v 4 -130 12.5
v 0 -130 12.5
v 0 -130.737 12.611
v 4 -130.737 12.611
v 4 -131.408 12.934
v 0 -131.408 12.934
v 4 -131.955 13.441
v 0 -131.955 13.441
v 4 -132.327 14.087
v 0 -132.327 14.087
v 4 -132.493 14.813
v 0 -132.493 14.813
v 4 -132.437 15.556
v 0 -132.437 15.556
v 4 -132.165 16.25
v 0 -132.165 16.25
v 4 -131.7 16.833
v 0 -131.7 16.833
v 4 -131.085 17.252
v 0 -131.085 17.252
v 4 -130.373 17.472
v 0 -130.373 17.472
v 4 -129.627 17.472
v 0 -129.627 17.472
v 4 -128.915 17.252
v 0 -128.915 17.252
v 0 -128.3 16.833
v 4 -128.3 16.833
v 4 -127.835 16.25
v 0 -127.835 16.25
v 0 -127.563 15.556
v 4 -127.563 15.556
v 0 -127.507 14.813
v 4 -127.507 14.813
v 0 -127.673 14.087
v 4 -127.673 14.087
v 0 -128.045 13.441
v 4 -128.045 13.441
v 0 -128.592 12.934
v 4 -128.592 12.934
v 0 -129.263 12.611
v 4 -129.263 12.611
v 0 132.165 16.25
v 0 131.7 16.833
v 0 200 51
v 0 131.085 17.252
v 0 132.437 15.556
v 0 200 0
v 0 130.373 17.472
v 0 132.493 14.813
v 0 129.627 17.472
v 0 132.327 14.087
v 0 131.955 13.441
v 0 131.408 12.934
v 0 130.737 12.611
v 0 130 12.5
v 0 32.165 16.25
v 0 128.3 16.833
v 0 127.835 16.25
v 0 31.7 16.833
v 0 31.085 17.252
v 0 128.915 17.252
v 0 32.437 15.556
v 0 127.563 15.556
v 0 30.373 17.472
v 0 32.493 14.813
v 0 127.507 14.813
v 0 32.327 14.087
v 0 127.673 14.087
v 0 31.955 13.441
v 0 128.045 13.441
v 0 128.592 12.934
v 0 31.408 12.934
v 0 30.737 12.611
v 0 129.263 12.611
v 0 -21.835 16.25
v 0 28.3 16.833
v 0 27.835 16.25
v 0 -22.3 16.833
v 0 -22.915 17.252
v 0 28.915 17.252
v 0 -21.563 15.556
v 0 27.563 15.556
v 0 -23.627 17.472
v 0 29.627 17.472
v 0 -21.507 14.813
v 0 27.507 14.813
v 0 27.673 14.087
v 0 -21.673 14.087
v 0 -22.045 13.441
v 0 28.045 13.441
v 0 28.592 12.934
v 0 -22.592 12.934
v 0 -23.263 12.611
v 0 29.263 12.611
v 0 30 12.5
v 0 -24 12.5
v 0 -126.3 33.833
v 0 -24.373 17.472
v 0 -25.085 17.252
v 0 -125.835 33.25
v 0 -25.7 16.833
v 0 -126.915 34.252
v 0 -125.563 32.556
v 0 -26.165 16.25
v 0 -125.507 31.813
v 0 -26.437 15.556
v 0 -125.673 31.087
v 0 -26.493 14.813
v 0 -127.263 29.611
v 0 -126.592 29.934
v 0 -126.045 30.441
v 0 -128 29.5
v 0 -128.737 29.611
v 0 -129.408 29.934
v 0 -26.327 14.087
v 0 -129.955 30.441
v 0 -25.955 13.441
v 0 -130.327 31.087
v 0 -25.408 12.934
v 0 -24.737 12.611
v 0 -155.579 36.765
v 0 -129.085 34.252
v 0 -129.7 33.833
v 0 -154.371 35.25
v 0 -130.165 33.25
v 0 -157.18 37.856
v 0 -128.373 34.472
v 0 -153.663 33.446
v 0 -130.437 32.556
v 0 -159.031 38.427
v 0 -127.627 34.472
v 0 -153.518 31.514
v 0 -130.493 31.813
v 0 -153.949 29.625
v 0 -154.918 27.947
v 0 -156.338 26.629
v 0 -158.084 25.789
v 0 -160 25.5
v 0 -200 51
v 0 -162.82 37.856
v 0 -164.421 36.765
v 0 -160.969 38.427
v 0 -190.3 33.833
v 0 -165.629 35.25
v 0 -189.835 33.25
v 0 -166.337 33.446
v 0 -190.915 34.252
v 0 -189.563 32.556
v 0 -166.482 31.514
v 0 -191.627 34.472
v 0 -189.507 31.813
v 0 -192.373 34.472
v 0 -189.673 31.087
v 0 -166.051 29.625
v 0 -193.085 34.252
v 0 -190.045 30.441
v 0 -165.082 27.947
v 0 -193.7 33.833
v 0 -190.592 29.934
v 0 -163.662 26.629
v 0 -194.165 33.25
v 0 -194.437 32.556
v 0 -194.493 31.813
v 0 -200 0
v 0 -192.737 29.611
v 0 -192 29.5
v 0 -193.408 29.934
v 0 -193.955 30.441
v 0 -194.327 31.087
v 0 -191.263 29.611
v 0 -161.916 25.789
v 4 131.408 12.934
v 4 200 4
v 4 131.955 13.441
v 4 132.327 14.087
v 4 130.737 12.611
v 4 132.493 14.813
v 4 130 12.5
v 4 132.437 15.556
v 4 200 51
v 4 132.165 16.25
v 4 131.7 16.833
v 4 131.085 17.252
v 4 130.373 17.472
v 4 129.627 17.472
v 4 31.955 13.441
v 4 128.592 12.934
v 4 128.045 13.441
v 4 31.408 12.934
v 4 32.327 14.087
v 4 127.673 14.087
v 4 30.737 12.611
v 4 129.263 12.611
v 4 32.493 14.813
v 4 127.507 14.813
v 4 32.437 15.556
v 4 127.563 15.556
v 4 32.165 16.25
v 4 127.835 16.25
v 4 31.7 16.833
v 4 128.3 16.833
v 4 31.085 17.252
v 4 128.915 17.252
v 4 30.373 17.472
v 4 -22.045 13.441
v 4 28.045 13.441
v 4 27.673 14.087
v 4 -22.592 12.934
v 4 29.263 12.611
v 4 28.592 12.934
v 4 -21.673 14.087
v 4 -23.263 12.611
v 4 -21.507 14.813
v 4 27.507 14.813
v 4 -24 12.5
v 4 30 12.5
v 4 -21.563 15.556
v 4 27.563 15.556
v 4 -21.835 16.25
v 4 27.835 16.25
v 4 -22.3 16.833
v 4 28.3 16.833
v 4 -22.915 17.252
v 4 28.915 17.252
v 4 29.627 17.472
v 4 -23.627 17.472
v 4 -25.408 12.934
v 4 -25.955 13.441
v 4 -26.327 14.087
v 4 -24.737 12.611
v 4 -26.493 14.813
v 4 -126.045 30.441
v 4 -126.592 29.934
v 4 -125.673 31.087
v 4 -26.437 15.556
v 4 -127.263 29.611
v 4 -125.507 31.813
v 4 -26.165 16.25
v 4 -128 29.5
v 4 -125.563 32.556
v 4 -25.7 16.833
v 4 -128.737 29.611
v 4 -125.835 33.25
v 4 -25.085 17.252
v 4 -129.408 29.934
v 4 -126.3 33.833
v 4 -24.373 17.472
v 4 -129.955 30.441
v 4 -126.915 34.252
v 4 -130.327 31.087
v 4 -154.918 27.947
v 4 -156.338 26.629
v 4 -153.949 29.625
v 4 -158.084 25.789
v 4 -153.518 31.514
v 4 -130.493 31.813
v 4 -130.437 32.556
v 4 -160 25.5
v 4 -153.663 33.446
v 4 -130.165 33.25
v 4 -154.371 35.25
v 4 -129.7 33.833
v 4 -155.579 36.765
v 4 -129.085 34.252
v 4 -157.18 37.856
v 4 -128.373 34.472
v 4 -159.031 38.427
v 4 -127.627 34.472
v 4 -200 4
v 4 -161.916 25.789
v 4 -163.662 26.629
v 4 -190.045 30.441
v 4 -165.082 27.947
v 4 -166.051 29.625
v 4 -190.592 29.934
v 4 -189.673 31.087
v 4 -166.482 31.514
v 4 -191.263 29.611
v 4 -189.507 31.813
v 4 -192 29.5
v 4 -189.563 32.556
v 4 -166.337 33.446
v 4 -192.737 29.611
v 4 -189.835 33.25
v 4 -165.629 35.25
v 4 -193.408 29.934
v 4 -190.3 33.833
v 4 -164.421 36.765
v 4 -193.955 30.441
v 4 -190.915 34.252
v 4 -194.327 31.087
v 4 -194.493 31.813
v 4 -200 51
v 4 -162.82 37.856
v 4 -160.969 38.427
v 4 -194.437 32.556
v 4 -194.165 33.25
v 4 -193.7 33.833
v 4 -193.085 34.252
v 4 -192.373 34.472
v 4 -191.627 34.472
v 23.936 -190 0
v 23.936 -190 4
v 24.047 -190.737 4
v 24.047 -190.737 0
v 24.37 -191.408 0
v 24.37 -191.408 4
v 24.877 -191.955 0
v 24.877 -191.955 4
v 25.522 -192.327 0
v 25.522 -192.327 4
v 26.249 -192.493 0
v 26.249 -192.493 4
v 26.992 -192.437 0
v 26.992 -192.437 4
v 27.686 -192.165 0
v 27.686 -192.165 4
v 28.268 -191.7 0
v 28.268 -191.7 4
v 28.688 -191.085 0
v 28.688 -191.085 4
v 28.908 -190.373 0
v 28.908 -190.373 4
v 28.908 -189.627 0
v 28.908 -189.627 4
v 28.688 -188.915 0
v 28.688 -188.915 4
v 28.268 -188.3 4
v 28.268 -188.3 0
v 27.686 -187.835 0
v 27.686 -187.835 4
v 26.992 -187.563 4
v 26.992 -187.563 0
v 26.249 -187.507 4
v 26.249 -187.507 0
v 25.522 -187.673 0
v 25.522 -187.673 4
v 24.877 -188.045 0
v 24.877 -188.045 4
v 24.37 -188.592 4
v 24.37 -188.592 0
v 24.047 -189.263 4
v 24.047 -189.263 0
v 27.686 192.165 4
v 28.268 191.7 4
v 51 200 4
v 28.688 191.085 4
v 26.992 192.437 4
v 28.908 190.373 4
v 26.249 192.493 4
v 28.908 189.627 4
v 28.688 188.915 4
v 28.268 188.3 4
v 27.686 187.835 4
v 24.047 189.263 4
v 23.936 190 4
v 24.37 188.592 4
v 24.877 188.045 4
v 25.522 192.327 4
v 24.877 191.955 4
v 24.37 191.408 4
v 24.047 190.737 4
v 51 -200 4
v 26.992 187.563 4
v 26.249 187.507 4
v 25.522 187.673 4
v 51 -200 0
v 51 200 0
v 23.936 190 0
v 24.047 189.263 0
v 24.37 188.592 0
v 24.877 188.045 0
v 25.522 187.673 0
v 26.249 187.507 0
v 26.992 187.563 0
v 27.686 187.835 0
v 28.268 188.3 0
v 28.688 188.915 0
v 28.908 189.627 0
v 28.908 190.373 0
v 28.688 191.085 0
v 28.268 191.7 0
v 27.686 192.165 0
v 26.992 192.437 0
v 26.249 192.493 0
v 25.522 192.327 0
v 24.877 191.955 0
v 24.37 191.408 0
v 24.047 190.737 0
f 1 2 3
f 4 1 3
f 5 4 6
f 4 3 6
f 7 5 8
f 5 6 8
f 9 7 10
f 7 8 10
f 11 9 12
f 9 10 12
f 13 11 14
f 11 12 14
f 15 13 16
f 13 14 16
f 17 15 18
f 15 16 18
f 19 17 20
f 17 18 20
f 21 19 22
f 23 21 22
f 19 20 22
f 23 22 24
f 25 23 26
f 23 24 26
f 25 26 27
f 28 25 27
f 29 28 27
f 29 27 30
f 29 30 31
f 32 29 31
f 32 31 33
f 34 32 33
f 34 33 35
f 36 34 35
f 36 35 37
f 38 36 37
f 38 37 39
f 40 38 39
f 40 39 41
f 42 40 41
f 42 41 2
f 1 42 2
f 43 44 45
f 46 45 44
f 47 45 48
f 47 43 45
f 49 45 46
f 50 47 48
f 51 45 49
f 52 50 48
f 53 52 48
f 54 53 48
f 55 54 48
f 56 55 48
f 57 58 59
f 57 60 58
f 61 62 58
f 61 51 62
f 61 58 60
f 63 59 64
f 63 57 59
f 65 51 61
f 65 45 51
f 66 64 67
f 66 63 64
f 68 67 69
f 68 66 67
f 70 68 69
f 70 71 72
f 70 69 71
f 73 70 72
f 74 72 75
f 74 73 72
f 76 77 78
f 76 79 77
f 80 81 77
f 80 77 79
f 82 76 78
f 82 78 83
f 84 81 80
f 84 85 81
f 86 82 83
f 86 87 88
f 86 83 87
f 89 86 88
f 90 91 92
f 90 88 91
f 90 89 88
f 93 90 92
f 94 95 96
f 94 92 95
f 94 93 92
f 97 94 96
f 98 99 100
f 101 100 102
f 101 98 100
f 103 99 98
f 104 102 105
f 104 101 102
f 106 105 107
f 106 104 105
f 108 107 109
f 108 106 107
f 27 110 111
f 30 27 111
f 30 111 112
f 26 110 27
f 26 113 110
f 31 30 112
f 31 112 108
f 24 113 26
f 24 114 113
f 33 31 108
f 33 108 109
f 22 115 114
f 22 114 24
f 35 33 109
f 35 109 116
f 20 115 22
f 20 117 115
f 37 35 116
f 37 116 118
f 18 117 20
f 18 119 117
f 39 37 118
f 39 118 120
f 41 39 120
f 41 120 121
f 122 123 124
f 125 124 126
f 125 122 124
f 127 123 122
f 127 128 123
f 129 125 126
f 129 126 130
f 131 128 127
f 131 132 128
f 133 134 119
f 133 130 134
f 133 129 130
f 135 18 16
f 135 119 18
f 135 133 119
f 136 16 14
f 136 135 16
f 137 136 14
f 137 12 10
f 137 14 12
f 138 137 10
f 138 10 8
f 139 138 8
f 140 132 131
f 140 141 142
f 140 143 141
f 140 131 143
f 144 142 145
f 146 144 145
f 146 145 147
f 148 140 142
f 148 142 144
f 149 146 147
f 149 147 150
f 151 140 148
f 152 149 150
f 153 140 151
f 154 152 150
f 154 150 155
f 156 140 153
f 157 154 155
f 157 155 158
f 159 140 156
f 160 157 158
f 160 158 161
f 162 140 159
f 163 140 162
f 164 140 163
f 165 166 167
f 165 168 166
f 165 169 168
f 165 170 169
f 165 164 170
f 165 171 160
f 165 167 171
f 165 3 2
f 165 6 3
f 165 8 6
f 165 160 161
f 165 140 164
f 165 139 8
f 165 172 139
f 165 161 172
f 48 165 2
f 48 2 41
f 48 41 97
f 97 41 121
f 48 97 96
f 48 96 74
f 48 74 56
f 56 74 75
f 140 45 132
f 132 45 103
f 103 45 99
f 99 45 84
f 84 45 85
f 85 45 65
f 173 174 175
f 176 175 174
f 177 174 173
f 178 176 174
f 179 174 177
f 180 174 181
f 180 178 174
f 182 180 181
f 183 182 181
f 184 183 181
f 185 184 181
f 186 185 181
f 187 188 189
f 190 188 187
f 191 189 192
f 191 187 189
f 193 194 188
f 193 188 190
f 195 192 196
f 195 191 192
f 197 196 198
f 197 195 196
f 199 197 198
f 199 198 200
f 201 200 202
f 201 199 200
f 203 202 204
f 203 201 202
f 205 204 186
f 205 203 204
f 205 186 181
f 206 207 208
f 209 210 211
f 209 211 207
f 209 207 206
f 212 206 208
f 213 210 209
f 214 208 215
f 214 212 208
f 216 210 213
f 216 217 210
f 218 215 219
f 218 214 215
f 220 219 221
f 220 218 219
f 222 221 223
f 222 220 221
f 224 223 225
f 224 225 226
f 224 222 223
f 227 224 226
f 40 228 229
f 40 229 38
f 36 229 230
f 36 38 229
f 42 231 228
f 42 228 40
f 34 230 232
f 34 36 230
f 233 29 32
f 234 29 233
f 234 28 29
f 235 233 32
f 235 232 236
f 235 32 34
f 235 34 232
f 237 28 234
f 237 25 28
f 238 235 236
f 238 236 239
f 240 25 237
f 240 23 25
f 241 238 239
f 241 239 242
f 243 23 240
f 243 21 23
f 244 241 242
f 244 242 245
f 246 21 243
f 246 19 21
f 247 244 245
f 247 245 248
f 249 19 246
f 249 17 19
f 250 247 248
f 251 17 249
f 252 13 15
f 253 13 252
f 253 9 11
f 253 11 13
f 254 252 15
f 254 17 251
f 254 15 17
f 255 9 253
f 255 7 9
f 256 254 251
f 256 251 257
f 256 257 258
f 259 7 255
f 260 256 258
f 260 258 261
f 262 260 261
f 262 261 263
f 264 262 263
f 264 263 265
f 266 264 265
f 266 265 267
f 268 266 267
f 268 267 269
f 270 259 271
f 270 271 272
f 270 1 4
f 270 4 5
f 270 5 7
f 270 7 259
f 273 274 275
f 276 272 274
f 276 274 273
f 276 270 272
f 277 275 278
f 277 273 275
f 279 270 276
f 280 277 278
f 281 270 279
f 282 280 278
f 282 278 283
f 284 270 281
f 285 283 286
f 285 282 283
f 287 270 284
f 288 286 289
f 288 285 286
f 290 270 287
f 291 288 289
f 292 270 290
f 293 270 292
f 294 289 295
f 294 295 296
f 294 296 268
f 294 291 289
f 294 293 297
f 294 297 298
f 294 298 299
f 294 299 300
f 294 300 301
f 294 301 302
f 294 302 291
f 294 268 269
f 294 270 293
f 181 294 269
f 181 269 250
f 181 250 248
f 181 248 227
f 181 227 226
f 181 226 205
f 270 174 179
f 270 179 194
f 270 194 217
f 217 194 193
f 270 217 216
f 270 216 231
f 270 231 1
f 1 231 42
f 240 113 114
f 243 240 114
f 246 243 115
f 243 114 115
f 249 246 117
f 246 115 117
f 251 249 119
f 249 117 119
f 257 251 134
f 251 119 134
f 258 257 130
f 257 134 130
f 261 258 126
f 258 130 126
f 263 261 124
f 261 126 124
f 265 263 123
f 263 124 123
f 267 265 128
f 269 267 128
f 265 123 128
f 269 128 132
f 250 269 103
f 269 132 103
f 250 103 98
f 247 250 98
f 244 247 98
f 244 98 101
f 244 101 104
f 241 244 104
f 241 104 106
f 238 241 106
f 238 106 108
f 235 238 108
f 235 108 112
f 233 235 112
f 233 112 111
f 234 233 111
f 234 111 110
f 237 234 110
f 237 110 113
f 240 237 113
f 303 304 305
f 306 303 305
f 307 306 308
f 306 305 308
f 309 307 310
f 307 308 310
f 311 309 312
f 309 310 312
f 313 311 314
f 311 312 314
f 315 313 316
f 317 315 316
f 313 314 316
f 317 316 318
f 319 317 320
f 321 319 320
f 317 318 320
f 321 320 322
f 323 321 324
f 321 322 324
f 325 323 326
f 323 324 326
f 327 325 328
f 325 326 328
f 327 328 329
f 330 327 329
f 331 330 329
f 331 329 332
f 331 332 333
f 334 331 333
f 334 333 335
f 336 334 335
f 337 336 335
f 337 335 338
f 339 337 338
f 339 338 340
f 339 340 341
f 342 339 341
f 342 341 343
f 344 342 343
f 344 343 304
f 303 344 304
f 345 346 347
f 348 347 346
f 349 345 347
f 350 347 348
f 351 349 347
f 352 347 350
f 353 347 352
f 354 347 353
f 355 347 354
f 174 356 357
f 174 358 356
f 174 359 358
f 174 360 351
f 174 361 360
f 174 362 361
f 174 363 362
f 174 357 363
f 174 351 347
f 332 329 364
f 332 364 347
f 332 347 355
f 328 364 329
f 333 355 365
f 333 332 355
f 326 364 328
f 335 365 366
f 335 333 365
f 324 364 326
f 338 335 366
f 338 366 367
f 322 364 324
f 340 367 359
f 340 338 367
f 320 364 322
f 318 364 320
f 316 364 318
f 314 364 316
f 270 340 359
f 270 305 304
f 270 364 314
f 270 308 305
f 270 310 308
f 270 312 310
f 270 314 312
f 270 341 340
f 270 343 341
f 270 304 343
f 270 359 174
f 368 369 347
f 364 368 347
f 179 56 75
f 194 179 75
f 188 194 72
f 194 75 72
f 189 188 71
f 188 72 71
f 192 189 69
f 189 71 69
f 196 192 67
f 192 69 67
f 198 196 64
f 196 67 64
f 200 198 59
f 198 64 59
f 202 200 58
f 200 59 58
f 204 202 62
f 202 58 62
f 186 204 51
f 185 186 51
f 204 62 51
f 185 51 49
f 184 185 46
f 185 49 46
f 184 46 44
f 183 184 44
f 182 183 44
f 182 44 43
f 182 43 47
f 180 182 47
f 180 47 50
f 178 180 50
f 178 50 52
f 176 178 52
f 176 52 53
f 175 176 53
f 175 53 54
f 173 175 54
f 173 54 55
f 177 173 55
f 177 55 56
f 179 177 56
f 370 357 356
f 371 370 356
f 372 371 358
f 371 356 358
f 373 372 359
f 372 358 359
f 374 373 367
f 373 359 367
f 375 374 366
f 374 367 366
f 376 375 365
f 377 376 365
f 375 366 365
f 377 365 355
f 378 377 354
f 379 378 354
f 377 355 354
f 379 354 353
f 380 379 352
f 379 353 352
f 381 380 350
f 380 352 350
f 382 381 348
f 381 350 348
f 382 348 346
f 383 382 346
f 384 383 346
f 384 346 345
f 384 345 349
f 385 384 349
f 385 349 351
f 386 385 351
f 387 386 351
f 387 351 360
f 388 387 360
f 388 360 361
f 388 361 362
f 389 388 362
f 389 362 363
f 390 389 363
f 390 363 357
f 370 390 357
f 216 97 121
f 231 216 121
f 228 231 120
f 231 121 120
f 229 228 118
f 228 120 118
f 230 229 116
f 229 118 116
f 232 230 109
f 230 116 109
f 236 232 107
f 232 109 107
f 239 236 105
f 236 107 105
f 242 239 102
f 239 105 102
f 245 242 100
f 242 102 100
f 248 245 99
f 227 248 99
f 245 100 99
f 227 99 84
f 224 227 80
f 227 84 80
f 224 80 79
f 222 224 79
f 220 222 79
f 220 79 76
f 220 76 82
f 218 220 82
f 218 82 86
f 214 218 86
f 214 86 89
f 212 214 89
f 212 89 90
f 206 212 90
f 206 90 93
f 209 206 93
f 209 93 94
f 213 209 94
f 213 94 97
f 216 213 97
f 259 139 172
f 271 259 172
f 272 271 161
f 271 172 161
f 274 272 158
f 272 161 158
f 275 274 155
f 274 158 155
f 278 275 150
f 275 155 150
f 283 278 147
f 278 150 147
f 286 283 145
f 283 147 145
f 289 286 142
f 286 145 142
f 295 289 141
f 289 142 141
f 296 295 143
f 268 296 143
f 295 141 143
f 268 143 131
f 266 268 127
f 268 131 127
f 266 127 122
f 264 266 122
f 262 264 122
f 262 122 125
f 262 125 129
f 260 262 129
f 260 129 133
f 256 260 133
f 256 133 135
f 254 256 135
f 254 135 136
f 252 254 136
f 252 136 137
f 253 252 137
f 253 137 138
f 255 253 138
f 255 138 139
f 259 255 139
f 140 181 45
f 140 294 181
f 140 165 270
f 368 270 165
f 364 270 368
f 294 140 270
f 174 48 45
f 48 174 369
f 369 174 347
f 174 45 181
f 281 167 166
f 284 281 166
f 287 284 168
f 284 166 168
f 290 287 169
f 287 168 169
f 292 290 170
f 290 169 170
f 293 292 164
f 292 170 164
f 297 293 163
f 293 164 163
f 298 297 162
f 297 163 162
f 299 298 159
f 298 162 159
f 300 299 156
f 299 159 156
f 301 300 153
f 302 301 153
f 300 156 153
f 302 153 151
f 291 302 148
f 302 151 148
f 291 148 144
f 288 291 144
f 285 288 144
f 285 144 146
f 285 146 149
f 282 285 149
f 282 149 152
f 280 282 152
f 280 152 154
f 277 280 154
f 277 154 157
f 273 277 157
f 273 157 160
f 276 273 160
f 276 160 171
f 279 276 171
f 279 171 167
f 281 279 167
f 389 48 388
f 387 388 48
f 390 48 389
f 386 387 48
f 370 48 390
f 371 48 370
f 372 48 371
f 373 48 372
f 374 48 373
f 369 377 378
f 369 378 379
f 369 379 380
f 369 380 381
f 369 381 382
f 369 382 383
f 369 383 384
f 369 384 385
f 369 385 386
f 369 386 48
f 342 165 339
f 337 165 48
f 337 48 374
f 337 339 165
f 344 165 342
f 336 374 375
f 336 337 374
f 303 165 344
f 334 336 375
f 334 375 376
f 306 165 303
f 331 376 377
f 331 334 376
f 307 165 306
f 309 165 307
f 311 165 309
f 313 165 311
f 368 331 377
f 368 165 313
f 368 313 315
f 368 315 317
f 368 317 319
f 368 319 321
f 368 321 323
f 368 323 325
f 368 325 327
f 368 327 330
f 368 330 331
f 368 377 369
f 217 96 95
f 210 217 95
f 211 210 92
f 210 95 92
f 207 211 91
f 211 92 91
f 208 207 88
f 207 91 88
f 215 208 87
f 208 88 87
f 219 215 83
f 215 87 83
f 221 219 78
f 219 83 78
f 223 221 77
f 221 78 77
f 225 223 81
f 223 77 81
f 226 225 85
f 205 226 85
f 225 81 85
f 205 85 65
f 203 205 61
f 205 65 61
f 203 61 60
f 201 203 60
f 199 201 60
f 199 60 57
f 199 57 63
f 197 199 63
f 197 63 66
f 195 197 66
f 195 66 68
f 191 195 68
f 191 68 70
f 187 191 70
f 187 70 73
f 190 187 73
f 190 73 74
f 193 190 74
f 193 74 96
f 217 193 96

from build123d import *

# Parameters (mm, degrees)
PAD_DEPTH         = 200
SKETCH001_R       = 2.5
POCKET_DEPTH      = 4.001
POCKET_DEPTH_BACK = -47.001
SKETCH003_R       = 2.5
SKETCH003_R_2     = 6.5
POCKET001_DEPTH   = 51.001


with BuildPart() as part:
    # Sketch → Pad (new body, symmetric)
    with BuildSketch(Plane.XZ):
        Polygon((0, 51), (0, 0), (51, 0), (51, 4), (4, 4), (4, 51), align=None)
    extrude(amount=PAD_DEPTH, both=True)

    # Sketch001 → Pocket (cut, two sides)
    with BuildSketch(Plane(origin=(0, 0, 4), x_dir=(-1, 0, 0), z_dir=(0, 0, 1))) as pocket_sk:
        with Locations((-26.435764, 190)):
            Circle(SKETCH001_R)
        with Locations((-26.435764, -190)):
            Circle(SKETCH001_R)
    extrude(amount=-POCKET_DEPTH, mode=Mode.SUBTRACT)
    extrude(pocket_sk.sketch, amount=-POCKET_DEPTH_BACK, mode=Mode.SUBTRACT)

    # Sketch003 → Pocket001 (cut, through all)
    with BuildSketch(Plane(origin=(0, 0, 0), x_dir=(0, 0, -1), z_dir=(-1, 0, 0))):
        with Locations((-15, 130)):
            Circle(SKETCH003_R)
        with Locations((-15, -130)):
            Circle(SKETCH003_R)
        with Locations((-15, -30)):
            Circle(SKETCH003_R)
        with Locations((-15, 24)):
            Circle(SKETCH003_R)
        with Locations((-32, 160)):
            Circle(SKETCH003_R_2)
        with Locations((-32, 192)):
            Circle(SKETCH003_R)
        with Locations((-32, 128)):
            Circle(SKETCH003_R)
    extrude(amount=-POCKET001_DEPTH, mode=Mode.SUBTRACT)


solid = part.part
